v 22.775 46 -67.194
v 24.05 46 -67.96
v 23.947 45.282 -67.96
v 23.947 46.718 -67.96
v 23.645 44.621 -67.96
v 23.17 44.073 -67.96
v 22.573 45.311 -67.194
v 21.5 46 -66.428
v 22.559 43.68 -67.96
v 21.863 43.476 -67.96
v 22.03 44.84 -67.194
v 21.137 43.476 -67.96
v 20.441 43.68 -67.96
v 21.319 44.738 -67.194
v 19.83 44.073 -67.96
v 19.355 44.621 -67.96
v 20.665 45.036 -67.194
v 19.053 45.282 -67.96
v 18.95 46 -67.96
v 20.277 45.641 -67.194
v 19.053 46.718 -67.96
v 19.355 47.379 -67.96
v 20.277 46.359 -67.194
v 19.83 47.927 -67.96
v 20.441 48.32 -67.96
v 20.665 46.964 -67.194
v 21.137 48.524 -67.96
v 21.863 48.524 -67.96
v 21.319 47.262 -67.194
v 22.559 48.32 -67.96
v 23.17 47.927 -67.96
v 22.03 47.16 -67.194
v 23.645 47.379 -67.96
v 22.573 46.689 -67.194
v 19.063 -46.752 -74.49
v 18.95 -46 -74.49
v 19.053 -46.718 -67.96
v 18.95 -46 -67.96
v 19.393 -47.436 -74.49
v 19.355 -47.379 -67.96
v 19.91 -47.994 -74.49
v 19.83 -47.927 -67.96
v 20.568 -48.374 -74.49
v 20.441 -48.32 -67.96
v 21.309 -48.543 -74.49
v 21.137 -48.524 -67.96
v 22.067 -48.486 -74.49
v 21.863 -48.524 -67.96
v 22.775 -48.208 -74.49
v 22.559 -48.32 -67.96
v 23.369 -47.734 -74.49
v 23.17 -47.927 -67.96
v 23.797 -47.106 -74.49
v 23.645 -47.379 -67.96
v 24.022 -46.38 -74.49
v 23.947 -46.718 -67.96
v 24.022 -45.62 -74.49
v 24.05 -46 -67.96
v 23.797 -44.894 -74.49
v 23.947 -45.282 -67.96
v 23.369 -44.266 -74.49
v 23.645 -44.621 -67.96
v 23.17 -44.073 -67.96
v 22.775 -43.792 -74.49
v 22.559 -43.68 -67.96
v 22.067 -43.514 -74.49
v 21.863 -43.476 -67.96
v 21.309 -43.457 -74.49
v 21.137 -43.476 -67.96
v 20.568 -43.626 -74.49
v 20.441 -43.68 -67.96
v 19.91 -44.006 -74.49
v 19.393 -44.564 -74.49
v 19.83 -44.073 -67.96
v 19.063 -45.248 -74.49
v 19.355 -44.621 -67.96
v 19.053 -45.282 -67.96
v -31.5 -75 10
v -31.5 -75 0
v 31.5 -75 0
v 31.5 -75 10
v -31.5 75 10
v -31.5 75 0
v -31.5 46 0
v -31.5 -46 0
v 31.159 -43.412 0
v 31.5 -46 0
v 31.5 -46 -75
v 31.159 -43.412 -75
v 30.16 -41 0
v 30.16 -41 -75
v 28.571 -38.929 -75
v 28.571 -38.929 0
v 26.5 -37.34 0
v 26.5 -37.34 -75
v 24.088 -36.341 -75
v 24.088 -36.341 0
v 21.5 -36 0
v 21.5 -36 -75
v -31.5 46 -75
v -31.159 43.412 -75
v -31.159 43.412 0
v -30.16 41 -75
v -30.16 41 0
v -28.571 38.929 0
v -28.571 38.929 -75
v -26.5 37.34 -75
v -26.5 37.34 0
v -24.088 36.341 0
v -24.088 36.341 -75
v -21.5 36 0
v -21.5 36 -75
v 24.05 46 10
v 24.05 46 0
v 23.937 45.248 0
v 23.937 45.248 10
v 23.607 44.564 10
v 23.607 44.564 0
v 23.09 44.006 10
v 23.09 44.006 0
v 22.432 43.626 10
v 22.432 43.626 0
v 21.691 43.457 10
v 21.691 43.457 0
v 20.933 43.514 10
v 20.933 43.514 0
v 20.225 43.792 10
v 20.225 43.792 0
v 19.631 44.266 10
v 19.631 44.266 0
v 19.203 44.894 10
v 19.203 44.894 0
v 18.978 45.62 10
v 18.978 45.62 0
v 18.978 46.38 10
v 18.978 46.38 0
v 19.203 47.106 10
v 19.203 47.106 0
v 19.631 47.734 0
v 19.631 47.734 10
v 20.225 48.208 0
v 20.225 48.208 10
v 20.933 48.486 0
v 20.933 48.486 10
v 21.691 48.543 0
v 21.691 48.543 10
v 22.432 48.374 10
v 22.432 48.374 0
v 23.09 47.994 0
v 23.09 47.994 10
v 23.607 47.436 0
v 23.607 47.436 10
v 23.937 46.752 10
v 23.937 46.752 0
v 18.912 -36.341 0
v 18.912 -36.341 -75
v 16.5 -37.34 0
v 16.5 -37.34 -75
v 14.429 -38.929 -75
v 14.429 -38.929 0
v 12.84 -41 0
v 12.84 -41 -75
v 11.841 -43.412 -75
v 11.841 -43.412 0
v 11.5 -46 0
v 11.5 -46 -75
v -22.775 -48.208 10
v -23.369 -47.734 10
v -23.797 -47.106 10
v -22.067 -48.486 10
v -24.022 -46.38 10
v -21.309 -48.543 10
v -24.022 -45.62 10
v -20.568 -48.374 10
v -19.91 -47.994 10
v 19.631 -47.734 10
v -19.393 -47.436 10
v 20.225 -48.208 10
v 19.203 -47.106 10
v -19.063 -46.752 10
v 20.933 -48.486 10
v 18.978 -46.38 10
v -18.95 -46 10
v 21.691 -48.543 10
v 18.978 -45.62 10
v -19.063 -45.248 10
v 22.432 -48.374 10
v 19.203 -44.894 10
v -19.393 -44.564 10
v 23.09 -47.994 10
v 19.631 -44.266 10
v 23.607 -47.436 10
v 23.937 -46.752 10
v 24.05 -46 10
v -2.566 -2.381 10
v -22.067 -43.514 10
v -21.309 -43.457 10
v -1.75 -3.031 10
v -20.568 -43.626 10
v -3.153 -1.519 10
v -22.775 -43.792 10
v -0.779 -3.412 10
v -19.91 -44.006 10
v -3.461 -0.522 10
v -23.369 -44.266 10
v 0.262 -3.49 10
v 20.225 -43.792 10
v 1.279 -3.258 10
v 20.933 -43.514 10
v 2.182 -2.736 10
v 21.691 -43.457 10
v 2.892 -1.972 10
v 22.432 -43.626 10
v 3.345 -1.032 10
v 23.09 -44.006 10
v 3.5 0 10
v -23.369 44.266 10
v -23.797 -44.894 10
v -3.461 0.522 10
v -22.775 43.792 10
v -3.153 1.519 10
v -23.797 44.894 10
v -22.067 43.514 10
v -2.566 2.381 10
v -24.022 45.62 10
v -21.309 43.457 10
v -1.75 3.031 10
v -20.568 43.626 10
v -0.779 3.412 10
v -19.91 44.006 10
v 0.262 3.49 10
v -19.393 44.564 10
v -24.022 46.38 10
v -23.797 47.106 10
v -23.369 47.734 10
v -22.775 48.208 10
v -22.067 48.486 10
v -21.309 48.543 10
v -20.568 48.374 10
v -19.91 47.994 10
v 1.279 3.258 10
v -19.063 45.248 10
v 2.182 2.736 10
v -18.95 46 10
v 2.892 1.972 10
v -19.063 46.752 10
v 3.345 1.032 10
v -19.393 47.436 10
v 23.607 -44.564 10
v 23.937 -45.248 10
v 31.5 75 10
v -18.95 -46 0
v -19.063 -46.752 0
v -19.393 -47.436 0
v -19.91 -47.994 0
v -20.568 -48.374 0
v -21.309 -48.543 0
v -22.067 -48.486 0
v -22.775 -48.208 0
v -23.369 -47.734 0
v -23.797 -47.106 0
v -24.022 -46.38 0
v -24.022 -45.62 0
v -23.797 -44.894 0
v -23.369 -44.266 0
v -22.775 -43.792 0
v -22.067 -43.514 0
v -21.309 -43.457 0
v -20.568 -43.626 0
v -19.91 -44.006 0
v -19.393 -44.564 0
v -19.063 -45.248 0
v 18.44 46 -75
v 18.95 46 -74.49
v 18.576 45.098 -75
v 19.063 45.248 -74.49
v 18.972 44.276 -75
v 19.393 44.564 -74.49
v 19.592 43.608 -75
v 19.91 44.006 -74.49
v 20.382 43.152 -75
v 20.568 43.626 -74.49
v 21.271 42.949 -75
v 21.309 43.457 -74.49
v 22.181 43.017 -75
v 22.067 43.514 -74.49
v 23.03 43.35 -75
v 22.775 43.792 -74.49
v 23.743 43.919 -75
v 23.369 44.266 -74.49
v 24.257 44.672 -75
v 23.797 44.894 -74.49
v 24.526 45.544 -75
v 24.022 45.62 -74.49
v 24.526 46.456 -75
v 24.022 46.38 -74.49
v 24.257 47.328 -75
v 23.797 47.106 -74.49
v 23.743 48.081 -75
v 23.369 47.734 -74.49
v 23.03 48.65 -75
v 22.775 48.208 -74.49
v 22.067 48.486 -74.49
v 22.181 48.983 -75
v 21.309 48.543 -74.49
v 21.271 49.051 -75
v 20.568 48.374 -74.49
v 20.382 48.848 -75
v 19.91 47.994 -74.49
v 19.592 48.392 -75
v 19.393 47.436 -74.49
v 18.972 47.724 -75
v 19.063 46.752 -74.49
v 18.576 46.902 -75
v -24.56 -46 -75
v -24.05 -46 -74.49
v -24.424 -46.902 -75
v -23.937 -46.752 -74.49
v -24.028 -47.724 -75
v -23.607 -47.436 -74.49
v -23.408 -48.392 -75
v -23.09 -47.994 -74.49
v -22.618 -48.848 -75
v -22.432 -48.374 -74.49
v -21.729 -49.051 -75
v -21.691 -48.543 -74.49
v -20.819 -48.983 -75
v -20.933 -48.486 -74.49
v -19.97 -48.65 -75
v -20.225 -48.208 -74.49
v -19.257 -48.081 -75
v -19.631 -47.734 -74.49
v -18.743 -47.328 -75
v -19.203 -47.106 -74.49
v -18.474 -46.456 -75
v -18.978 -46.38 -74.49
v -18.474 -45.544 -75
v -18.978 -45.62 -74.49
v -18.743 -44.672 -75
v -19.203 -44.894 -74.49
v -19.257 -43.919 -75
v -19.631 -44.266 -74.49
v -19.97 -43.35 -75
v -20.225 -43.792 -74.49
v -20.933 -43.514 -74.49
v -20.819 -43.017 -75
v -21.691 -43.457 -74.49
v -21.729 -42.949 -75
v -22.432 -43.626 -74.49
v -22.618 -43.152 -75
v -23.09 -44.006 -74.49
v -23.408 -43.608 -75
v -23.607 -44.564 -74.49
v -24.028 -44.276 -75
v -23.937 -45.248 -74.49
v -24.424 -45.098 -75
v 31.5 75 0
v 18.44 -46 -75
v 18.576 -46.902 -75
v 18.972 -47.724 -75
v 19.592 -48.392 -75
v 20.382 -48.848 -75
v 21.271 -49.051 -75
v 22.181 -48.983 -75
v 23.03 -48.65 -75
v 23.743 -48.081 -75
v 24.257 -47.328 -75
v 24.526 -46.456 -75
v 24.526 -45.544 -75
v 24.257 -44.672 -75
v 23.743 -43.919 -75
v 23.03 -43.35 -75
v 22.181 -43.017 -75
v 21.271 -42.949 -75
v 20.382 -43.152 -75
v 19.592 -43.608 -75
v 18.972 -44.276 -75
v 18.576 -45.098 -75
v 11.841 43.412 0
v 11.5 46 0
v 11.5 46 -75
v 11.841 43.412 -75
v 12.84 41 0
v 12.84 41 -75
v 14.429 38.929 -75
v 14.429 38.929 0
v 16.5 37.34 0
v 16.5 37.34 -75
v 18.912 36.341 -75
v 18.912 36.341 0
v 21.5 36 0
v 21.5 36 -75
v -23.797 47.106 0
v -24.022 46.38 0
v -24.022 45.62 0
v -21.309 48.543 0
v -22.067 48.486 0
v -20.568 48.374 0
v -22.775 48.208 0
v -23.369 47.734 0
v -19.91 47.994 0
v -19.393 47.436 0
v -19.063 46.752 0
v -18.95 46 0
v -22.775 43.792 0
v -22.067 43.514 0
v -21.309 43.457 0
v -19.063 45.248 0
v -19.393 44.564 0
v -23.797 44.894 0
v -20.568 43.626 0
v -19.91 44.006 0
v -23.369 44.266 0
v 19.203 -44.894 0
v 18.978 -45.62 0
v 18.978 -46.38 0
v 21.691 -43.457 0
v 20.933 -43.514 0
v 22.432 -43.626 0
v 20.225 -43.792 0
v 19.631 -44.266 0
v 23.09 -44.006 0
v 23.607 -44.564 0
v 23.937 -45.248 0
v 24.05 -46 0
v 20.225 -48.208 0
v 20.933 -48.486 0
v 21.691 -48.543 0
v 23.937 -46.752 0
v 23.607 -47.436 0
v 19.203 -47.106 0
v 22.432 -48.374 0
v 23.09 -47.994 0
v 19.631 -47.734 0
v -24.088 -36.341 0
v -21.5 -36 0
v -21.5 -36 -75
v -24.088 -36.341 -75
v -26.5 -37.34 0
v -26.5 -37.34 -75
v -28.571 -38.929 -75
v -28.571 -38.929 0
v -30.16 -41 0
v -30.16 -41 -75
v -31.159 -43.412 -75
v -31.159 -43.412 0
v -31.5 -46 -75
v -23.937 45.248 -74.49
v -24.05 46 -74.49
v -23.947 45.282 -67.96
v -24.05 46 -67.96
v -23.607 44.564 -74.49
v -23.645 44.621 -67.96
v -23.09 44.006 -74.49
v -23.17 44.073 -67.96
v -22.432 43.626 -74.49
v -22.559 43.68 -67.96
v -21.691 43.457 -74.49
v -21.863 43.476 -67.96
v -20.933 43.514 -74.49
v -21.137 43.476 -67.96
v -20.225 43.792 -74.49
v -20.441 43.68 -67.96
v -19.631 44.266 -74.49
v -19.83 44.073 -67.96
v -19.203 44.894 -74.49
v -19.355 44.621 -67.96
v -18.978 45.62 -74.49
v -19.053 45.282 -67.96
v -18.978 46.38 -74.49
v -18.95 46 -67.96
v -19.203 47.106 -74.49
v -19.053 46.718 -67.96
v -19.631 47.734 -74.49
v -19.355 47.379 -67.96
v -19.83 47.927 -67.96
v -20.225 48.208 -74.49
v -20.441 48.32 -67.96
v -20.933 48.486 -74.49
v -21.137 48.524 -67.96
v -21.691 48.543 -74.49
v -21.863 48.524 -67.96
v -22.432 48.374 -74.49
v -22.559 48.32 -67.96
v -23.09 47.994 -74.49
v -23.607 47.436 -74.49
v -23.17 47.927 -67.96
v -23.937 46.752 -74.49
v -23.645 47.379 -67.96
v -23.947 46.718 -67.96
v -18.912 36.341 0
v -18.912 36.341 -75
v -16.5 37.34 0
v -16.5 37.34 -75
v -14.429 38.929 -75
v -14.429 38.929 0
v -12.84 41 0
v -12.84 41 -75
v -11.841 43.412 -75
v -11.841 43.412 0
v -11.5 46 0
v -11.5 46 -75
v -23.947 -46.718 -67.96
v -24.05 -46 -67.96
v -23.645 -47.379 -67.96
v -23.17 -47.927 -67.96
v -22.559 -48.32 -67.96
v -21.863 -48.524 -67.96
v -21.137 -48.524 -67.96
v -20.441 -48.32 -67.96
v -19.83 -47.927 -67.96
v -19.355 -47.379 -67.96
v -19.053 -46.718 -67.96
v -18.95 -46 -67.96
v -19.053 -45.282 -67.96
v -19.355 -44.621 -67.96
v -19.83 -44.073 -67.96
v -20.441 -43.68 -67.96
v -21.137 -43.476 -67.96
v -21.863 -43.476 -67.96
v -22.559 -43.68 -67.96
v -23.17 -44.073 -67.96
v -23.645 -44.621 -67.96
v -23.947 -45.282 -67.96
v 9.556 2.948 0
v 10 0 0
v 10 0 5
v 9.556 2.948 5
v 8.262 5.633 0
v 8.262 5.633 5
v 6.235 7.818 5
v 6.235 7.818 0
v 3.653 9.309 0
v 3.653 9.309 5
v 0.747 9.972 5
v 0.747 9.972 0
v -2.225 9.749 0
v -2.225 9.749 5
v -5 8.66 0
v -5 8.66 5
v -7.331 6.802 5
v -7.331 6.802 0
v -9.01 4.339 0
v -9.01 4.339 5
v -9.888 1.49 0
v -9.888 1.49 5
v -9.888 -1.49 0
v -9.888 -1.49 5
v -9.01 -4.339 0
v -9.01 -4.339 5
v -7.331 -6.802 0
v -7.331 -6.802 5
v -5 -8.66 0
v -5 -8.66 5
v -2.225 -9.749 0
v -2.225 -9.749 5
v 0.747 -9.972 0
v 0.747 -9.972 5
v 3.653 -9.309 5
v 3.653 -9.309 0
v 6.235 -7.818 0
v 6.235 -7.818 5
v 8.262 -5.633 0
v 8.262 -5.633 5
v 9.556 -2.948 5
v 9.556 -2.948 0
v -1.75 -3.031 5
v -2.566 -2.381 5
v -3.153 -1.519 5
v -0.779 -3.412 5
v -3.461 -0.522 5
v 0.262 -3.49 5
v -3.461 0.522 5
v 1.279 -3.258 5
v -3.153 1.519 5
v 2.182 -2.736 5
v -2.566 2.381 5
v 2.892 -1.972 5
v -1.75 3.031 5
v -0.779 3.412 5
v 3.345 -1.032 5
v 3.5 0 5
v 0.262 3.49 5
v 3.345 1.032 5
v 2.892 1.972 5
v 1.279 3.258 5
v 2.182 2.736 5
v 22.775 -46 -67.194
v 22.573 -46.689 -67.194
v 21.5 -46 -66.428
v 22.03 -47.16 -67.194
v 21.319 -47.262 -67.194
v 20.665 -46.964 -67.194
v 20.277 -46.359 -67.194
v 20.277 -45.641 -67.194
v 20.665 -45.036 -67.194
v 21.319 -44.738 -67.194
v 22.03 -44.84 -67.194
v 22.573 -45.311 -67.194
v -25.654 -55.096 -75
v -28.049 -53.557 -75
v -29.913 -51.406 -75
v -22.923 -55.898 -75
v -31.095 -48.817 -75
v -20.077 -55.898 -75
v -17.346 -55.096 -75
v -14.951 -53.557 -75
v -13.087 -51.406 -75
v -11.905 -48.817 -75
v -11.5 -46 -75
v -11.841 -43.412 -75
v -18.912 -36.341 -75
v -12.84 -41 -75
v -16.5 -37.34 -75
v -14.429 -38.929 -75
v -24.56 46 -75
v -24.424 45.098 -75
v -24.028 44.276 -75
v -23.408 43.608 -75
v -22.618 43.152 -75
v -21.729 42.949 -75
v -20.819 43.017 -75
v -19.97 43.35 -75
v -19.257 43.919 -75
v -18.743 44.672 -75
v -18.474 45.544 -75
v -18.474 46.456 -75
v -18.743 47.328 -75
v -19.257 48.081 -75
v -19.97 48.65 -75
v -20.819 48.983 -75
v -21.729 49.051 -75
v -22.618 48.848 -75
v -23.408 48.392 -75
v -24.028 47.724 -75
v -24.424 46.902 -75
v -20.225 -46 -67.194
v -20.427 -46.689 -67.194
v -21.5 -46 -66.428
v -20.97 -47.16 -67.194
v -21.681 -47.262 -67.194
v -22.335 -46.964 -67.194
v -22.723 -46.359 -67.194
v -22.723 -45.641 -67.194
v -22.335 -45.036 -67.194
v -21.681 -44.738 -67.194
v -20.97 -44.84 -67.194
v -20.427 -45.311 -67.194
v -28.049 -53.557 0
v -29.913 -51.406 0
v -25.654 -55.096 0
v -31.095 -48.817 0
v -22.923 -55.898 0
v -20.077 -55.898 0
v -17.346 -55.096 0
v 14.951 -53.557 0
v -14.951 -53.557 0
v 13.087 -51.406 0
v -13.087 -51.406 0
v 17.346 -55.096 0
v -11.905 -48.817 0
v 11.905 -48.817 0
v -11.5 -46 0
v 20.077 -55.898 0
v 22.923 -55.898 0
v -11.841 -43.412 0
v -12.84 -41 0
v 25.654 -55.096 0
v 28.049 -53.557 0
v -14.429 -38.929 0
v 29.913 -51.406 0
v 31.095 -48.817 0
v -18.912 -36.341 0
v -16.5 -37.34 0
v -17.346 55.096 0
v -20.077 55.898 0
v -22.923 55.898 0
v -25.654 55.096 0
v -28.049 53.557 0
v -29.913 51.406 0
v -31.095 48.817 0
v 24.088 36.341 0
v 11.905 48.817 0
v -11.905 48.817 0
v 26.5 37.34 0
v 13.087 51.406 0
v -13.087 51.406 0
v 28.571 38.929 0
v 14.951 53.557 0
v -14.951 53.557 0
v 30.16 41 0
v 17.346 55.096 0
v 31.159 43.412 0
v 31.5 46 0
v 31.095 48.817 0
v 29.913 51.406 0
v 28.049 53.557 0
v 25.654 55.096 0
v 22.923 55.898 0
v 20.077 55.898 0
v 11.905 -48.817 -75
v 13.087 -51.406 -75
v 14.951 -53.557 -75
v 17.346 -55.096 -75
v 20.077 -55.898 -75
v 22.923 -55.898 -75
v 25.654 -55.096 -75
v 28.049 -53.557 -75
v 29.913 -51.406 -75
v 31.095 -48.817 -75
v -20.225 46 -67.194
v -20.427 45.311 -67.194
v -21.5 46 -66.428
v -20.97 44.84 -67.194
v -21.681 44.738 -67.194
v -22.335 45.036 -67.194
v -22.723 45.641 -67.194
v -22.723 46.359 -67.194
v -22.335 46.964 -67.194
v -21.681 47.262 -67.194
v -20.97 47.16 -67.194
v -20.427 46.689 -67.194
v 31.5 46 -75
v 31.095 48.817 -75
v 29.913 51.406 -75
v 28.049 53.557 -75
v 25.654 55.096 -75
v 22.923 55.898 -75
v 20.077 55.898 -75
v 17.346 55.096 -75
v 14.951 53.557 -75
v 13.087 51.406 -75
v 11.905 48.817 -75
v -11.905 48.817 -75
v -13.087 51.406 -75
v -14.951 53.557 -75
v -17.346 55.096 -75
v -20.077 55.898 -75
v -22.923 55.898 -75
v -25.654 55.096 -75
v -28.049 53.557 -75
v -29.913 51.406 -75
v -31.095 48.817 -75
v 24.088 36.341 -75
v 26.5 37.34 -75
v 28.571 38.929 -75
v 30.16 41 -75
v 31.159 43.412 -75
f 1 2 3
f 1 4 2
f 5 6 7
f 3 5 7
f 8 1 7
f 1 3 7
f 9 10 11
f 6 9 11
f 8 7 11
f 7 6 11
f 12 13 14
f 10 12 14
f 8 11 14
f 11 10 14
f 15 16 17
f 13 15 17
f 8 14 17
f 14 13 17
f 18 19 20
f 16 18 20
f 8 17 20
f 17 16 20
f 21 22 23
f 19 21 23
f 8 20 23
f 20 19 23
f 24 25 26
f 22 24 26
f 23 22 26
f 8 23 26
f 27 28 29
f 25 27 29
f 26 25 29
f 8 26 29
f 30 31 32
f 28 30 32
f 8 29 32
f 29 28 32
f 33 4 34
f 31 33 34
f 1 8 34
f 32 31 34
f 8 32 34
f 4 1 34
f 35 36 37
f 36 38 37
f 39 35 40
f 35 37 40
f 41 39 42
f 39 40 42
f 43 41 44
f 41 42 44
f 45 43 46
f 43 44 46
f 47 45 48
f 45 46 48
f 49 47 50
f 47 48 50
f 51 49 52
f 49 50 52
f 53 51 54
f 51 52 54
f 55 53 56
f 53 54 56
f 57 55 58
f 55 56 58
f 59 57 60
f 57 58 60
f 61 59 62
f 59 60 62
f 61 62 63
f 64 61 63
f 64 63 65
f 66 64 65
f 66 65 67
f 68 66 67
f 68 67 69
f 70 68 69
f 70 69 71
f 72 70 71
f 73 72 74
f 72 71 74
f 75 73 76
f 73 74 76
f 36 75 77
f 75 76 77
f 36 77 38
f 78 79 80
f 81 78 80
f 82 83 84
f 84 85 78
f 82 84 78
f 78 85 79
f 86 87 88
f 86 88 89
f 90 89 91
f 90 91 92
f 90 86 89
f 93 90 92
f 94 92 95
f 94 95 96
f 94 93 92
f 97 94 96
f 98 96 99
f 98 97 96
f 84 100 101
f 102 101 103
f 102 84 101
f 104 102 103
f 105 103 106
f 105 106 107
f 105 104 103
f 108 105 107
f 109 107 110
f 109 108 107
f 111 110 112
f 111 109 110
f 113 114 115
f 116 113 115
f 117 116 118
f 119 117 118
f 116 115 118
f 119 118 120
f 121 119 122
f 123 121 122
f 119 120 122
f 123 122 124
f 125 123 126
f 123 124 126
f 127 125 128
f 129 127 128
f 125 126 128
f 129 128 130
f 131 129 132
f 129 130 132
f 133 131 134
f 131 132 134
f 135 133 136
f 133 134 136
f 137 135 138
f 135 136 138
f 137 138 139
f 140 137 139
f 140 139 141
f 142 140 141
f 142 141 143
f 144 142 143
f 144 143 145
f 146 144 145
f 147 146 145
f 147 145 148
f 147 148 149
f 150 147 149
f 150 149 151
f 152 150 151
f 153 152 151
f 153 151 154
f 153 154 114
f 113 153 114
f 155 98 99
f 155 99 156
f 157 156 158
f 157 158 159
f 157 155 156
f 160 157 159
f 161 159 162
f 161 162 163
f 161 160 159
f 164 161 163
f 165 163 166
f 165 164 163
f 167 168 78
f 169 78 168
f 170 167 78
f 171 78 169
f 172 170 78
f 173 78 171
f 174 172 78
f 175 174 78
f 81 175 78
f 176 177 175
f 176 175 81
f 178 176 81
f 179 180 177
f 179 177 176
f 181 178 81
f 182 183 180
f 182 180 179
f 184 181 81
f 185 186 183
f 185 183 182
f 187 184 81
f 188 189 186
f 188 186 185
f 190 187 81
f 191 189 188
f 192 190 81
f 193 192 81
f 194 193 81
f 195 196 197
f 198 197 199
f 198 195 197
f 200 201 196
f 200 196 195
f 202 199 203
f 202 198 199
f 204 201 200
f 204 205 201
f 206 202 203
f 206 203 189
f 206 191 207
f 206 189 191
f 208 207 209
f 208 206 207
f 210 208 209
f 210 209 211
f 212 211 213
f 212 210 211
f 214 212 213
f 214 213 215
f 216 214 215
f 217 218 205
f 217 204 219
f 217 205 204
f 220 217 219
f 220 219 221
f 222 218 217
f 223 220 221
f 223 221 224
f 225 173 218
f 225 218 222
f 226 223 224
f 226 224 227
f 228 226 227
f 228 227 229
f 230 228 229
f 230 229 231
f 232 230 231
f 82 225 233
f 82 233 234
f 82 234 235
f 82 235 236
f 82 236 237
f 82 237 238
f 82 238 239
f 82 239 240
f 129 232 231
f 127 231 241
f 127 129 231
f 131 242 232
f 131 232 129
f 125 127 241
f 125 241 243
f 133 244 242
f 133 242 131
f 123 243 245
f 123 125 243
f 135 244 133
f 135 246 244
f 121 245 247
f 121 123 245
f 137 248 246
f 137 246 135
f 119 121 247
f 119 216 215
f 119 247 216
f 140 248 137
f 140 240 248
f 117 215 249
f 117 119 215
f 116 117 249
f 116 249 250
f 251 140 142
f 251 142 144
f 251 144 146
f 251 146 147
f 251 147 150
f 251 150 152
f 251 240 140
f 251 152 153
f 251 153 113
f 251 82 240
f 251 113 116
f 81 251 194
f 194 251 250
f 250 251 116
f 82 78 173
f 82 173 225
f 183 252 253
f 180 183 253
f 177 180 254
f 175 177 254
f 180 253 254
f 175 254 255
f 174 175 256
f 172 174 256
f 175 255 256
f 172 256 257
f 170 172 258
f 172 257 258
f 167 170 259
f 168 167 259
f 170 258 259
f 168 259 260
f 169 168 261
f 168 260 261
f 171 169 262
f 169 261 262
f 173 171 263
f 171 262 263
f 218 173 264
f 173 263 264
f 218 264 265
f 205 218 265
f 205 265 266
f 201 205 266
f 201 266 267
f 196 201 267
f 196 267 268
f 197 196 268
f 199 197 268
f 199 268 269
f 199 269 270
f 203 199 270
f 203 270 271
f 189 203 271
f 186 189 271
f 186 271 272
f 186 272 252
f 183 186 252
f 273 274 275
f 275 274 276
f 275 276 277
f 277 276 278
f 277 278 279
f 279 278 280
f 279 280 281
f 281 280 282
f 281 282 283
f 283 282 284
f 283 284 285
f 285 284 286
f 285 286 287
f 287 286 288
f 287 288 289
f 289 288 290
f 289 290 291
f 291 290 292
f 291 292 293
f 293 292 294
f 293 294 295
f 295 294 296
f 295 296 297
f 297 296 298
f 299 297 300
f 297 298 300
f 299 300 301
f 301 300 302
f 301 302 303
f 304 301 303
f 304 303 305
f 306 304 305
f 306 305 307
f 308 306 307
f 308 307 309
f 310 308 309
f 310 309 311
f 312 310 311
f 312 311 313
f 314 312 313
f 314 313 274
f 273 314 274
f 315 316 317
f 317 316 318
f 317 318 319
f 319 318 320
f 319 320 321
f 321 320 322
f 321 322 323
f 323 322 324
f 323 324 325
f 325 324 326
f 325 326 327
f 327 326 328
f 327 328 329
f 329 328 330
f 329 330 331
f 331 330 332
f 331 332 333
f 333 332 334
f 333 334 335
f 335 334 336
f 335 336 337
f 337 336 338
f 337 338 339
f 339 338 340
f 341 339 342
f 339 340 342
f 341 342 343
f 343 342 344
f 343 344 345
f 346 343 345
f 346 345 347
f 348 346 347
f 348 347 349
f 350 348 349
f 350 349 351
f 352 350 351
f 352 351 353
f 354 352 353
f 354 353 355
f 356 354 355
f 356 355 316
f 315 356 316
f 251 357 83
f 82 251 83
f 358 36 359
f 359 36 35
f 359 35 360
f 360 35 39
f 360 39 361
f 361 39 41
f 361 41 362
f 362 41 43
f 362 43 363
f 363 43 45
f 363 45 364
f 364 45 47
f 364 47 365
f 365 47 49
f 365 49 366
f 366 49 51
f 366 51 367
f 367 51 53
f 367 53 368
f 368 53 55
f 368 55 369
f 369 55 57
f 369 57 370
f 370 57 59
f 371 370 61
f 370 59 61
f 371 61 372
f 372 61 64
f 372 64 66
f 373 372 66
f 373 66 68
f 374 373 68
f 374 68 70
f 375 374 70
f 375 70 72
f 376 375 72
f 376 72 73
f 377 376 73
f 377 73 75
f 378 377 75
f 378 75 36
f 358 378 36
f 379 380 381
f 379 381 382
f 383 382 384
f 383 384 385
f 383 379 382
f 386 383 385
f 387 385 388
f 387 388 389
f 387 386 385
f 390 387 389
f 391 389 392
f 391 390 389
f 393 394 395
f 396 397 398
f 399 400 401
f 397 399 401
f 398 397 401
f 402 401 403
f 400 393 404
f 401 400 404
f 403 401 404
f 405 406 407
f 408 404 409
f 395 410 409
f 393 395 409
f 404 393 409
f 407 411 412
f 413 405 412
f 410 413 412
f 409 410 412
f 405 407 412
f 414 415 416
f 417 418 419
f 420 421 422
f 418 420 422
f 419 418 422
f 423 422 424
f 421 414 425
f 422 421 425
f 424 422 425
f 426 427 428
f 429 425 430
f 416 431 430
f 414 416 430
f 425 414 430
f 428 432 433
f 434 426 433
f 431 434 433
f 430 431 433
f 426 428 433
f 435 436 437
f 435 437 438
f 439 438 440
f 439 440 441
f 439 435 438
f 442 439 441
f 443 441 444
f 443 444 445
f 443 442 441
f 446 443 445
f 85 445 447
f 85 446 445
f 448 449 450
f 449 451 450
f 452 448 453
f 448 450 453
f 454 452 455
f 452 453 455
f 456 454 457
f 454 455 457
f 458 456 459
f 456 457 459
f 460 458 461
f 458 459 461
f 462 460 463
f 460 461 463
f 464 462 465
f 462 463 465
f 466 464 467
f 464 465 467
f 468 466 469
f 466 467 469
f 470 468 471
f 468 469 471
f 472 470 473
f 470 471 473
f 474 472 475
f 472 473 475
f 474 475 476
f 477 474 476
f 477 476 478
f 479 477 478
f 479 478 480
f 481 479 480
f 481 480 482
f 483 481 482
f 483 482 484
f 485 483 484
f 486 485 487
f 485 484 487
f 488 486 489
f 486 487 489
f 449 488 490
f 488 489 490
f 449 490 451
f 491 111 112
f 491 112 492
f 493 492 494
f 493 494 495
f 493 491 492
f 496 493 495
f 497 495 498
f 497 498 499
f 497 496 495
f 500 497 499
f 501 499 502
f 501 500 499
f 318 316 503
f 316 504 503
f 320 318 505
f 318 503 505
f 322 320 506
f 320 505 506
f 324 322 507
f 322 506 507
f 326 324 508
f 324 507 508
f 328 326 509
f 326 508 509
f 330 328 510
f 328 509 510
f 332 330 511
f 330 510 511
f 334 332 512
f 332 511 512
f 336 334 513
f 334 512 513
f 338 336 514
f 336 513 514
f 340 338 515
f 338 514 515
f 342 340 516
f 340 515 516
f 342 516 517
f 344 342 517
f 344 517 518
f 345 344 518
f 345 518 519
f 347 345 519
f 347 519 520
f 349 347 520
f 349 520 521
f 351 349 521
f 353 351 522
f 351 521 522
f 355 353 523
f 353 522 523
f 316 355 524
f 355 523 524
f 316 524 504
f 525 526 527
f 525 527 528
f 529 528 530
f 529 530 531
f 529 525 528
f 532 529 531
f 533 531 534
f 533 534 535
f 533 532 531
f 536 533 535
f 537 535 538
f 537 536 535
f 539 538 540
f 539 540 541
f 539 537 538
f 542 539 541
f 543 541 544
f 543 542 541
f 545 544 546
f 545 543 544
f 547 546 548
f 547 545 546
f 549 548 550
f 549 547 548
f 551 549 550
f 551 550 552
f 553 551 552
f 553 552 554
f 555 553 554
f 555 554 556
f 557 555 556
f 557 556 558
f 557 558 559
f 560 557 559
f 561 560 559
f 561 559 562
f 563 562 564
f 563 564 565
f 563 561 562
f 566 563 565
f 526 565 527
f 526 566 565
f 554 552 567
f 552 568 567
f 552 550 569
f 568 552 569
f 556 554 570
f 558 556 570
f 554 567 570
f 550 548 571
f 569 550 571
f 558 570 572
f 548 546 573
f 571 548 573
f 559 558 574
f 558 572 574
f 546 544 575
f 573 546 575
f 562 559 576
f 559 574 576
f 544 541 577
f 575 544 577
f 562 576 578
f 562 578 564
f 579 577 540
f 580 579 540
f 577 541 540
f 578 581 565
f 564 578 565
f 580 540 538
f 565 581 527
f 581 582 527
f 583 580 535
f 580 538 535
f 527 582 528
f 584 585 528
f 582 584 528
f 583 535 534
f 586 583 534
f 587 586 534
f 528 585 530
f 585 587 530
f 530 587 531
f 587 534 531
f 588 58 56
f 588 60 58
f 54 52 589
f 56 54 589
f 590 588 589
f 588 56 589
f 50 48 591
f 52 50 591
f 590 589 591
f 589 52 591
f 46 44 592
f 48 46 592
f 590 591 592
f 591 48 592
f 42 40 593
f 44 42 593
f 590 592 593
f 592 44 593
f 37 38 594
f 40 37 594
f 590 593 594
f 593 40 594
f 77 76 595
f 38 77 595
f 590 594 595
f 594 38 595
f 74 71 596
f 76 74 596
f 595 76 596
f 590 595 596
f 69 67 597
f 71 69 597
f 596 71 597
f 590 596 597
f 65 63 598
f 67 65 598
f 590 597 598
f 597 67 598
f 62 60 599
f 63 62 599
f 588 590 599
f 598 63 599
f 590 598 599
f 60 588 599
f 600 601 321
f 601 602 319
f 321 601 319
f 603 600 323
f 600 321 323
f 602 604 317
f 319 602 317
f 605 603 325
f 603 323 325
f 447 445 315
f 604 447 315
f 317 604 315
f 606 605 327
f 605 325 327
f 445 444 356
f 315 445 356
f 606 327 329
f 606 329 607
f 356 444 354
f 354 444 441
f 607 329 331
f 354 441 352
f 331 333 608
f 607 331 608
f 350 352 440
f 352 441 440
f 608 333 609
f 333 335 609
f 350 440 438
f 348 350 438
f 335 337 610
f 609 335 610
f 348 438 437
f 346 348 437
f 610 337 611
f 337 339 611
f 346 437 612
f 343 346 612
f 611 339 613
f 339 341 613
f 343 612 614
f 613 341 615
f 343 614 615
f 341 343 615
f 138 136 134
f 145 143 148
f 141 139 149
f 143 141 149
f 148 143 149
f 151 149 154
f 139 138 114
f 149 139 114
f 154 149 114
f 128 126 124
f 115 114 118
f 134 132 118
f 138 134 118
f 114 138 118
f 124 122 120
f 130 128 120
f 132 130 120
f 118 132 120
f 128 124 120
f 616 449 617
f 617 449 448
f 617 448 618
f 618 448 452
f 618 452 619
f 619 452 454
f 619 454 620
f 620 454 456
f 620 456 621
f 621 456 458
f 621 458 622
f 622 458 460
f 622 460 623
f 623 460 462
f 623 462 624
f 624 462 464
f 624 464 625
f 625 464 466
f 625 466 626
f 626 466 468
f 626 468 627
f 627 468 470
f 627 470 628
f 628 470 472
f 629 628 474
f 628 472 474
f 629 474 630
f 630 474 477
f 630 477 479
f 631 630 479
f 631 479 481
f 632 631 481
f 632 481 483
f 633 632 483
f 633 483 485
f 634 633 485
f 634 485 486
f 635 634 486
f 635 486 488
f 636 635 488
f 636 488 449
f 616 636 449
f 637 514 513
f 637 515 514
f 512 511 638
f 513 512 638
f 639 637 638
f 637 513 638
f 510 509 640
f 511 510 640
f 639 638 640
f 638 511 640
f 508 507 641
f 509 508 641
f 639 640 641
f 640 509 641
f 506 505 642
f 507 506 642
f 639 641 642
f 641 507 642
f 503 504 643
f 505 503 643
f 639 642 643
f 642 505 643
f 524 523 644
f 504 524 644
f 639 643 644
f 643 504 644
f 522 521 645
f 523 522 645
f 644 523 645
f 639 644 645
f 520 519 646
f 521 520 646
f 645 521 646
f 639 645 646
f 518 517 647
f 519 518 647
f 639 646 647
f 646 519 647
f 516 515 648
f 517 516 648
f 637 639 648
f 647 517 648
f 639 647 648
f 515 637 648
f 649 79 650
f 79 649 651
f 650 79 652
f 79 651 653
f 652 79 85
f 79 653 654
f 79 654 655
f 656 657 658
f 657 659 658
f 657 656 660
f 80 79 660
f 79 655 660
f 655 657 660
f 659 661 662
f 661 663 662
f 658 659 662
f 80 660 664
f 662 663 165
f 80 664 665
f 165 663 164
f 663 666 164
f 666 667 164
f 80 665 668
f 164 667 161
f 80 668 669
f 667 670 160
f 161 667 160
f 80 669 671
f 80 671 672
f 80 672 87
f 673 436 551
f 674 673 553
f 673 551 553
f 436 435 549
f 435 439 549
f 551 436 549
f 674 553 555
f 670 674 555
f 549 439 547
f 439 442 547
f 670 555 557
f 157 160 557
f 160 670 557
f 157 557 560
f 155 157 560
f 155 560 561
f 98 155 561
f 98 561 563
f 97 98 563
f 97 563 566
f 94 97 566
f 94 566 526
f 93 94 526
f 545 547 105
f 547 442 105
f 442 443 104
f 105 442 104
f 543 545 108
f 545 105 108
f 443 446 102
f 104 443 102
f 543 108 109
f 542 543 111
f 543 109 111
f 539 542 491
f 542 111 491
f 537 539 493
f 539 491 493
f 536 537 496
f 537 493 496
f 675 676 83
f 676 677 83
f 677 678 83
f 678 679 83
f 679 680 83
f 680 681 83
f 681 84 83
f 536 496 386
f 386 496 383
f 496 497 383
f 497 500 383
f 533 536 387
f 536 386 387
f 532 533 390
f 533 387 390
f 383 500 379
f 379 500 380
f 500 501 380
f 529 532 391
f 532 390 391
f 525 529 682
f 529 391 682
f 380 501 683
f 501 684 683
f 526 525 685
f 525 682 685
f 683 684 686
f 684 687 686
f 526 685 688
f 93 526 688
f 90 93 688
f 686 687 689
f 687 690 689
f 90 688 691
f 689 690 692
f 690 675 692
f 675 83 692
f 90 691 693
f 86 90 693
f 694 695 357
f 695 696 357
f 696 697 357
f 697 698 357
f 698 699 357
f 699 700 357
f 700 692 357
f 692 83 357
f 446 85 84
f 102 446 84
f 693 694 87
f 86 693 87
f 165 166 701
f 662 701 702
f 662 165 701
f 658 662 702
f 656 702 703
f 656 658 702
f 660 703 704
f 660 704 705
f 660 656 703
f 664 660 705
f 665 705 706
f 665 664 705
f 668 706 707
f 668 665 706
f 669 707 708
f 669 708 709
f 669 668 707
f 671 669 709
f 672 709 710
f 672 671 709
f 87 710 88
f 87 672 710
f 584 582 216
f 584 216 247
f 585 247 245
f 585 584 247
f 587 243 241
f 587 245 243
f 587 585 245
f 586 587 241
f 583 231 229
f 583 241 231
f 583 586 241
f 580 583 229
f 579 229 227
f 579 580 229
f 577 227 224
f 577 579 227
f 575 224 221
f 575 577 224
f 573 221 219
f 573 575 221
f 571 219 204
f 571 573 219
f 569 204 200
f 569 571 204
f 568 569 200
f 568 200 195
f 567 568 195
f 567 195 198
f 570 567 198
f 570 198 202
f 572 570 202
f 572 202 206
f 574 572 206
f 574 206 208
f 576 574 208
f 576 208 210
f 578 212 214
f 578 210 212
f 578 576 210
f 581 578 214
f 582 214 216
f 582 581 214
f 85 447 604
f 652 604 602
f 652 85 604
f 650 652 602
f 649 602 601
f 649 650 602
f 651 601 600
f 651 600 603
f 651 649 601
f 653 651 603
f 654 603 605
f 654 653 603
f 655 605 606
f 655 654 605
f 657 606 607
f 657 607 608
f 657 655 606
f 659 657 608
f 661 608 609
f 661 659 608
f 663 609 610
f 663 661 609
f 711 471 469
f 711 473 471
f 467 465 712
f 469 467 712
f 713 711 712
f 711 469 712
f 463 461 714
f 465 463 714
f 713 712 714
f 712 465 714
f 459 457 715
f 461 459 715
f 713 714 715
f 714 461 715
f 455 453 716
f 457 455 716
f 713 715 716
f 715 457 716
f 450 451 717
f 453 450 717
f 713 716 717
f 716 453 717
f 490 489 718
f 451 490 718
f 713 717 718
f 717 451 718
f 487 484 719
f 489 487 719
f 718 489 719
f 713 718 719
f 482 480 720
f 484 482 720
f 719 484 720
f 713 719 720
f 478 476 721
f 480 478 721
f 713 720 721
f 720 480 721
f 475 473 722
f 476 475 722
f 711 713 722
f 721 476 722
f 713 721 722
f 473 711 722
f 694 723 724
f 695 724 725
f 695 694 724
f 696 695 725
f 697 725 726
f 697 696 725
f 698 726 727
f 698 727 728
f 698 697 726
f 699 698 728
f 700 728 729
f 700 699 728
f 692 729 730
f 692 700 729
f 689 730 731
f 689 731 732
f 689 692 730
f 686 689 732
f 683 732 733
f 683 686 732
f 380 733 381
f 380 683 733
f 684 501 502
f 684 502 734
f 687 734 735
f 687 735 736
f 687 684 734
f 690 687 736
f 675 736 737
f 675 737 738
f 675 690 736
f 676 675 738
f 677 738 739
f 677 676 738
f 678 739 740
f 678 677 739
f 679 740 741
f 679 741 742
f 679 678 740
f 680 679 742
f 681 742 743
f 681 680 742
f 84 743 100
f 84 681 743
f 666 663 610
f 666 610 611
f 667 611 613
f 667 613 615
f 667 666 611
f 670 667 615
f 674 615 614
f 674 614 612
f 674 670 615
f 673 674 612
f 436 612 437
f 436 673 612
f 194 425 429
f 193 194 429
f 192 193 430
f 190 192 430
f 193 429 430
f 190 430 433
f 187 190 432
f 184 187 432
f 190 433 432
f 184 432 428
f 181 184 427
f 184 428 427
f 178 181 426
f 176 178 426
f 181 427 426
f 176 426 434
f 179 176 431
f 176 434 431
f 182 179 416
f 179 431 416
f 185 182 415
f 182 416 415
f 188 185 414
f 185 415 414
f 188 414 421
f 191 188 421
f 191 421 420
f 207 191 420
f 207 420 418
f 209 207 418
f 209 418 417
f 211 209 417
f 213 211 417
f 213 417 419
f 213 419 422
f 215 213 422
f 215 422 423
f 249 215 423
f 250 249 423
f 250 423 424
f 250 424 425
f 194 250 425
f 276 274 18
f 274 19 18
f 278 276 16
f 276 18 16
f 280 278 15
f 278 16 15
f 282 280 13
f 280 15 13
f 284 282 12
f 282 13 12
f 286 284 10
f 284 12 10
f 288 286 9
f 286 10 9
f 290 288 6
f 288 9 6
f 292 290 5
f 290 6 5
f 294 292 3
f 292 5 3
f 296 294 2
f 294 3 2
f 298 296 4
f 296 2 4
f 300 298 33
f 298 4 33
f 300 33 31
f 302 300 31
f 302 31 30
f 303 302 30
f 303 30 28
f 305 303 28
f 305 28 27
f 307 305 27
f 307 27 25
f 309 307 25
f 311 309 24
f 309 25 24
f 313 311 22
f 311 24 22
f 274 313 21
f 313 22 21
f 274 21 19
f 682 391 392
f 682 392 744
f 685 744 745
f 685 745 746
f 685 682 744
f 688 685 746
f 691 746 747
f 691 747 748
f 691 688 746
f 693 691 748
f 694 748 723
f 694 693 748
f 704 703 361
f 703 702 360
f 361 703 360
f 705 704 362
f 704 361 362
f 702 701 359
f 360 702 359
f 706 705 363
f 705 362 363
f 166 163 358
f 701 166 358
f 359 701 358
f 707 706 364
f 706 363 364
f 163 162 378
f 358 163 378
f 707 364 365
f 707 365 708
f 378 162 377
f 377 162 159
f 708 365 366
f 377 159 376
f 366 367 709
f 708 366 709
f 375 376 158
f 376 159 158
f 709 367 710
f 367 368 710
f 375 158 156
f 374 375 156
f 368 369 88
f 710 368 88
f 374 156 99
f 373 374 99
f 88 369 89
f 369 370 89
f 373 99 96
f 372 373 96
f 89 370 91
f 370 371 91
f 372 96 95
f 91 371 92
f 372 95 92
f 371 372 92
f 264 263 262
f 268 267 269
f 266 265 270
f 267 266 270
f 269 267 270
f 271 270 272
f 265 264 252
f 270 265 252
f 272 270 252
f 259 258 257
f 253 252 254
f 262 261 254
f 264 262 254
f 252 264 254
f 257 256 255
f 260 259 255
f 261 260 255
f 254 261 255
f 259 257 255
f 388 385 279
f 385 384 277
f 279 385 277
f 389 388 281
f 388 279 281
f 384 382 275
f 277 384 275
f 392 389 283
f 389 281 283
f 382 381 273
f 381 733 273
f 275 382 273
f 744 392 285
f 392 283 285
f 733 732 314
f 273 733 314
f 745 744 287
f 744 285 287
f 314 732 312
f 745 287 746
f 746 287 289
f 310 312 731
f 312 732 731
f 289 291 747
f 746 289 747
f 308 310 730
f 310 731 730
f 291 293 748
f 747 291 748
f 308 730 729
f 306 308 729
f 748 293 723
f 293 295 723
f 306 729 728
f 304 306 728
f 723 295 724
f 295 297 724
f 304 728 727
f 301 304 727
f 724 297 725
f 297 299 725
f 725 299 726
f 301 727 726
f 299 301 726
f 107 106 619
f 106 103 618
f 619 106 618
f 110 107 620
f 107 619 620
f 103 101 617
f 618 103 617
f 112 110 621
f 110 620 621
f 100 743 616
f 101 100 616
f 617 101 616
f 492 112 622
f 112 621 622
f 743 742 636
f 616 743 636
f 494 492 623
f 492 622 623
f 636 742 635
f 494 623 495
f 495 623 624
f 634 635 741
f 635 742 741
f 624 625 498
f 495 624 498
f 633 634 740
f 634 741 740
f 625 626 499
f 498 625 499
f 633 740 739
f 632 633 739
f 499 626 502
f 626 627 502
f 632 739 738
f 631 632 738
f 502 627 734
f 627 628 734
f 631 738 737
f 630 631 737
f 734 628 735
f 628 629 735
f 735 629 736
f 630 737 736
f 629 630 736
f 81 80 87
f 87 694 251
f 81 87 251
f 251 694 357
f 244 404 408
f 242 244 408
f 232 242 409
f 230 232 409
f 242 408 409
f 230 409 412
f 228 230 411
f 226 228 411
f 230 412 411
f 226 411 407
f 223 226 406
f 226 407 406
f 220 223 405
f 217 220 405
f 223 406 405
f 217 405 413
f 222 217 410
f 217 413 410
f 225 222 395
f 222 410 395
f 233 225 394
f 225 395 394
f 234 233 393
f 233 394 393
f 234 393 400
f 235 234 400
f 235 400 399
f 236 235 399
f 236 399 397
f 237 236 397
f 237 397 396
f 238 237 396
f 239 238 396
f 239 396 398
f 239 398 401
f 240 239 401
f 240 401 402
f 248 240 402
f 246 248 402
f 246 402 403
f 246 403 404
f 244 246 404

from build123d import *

# Parameters (mm, degrees)
F5_DEPTH               = 10
F6_DEPTH               = 75
F11_D                  = 5.1
F11_DEPTH              = 7.04
F11_CSINK_D            = 6.12
F11_CSINK_ANGLE        = 90
F11_TIP                = 1.5321945785
F11_ON_F9_D            = 5.1
F11_ON_F9_DEPTH        = 7.04
F11_ON_F9_CSINK_D      = 6.12
F11_ON_F9_CSINK_ANGLE  = 90
F11_ON_F9_TIP          = 1.5321945785
F11_ON_F10_D           = 5.1
F11_ON_F10_DEPTH       = 7.04
F11_ON_F10_CSINK_D     = 6.12
F11_ON_F10_CSINK_ANGLE = 90
F11_ON_F10_TIP         = 1.5321945785
F11_ON_F8_D            = 5.1
F11_ON_F8_DEPTH        = 7.04
F11_ON_F8_CSINK_D      = 6.12
F11_ON_F8_CSINK_ANGLE  = 90
F11_ON_F8_TIP          = 1.5321945785
F12_D                  = 5.1
F12_DEPTH              = 11
F12_TIP                = 1.5321945785
F13_R                  = 3.5
F14_DEPTH              = 25
F15_R                  = 10
F16_DEPTH              = 5


with BuildPart() as f5:
    # F4 (on Top) → F5 (new body)
    with BuildSketch(Plane.XY):
        with BuildLine():
            ThreePointArc((21.5, -36), (28.5710678119, -38.9289321881), (31.5, -46))
            Line((31.5, -46), (31.5, 46))
            ThreePointArc((31.5, 46), (28.5710678119, 38.9289321881), (21.5, 36))
            Line((21.5, 36), (21.5, -36))
        make_face()
        with BuildLine():
            Line((-31.5, -75), (31.5, -75))
            Line((31.5, -75), (31.5, -46))
            ThreePointArc((31.5, -46), (21.5, -56), (11.5, -46))
            Line((11.5, -46), (-11.5, -46))
            ThreePointArc((-11.5, -46), (-21.5, -56), (-31.5, -46))
            Line((-31.5, -46), (-31.5, -75))
        make_face()
        with BuildLine():
            Line((-31.5, 45.999999887), (-31.5, -46))
            ThreePointArc((-31.5, -46), (-28.5710678119, -38.9289321881), (-21.5, -36))
            Line((-21.5, -36), (-21.5, 36))
            ThreePointArc((-21.5, 36), (-28.5710677719, 38.9289321482), (-31.5, 45.999999887))
        make_face()
        with BuildLine():
            ThreePointArc((11.5, -46), (14.4289321881, -38.9289321881), (21.5, -36))
            Line((21.5, -36), (21.5, 36))
            ThreePointArc((21.5, 36), (14.4289321881, 38.9289321881), (11.5, 46))
            Line((11.5, 46), (-11.5, 46))
            ThreePointArc((-11.5, 46), (-14.4289321881, 38.9289321881), (-21.5, 36))
            Line((-21.5, 36), (-21.5, -36))
            ThreePointArc((-21.5, -36), (-14.4289321881, -38.9289321881), (-11.5, -46))
            Line((-11.5, -46), (11.5, -46))
        make_face()
        with BuildLine():
            ThreePointArc((-21.5, -36), (-28.5710678119, -38.9289321881), (-31.5, -46))
            ThreePointArc((-31.5, -46), (-21.5, -56), (-11.5, -46))
            Line((-11.5, -46), (-18.95, -46))
            ThreePointArc((-18.95, -46), (-23.303122292, -47.803122292), (-21.5, -43.45))
            Line((-21.5, -43.45), (-21.5, -36))
        make_face()
        with BuildLine():
            ThreePointArc((-11.5, -46), (-14.4289321881, -38.9289321881), (-21.5, -36))
            Line((-21.5, -36), (-21.5, -43.45))
            ThreePointArc((-21.5, -43.45), (-19.696877708, -44.196877708), (-18.95, -46))
            Line((-18.95, -46), (-11.5, -46))
        make_face()
        with BuildLine():
            Line((-21.5, -46), (-21.5, -43.45))
            ThreePointArc((-21.5, -43.45), (-23.303122292, -47.803122292), (-18.95, -46))
            Line((-18.95, -46), (-21.5, -46))
        make_face()
        with BuildLine():
            ThreePointArc((-18.95, -46), (-19.696877708, -44.196877708), (-21.5, -43.45))
            Line((-21.5, -43.45), (-21.5, -46))
            Line((-21.5, -46), (-18.95, -46))
        make_face()
        with BuildLine():
            ThreePointArc((11.5, -46), (21.5, -56), (31.5, -46))
            ThreePointArc((31.5, -46), (28.5710678119, -38.9289321881), (21.5, -36))
            Line((21.5, -36), (21.5, -43.45))
            ThreePointArc((21.5, -43.45), (23.303122292, -44.196877708), (24.05, -46))
            ThreePointArc((24.05, -46), (21.5, -48.55), (18.95, -46))
            Line((18.95, -46), (11.5, -46))
        make_face()
        with BuildLine():
            Line((21.5, -46), (21.5, -43.45))
            ThreePointArc((21.5, -43.45), (19.696877708, -44.196877708), (18.95, -46))
            Line((18.95, -46), (21.5, -46))
        make_face()
        with BuildLine():
            ThreePointArc((24.05, -46), (23.303122292, -44.196877708), (21.5, -43.45))
            Line((21.5, -43.45), (21.5, -46))
            Line((21.5, -46), (18.95, -46))
            ThreePointArc((18.95, -46), (21.5, -48.55), (24.05, -46))
        make_face()
        with BuildLine():
            Line((21.5, -43.45), (21.5, -36))
            ThreePointArc((21.5, -36), (14.4289321881, -38.9289321881), (11.5, -46))
            Line((11.5, -46), (18.95, -46))
            ThreePointArc((18.95, -46), (19.696877708, -44.196877708), (21.5, -43.45))
        make_face()
        with BuildLine():
            Line((18.95, 46), (11.5, 46))
            ThreePointArc((11.5, 46), (14.4289321881, 38.9289321881), (21.5, 36))
            Line((21.5, 36), (21.5, 43.45))
            ThreePointArc((21.5, 43.45), (19.696877708, 44.196877708), (18.95, 46))
        make_face()
        with BuildLine():
            Line((21.5, 46), (18.95, 46))
            ThreePointArc((18.95, 46), (19.696877708, 44.196877708), (21.5, 43.45))
            Line((21.5, 43.45), (21.5, 46))
        make_face()
        with BuildLine():
            ThreePointArc((24.05, 46), (21.5, 48.55), (18.95, 46))
            Line((18.95, 46), (21.5, 46))
            Line((21.5, 46), (21.5, 43.45))
            ThreePointArc((21.5, 43.45), (23.303122292, 44.196877708), (24.05, 46))
        make_face()
        with BuildLine():
            ThreePointArc((21.5, 36), (28.5710678119, 38.9289321881), (31.5, 46))
            ThreePointArc((31.5, 46), (21.5, 56), (11.5, 46))
            Line((11.5, 46), (18.95, 46))
            ThreePointArc((18.95, 46), (21.5, 48.55), (24.05, 46))
            ThreePointArc((24.05, 46), (23.303122292, 44.196877708), (21.5, 43.45))
            Line((21.5, 43.45), (21.5, 36))
        make_face()
        with BuildLine():
            ThreePointArc((-21.5, 36), (-14.4289321881, 38.9289321881), (-11.5, 46))
            Line((-11.5, 46), (-18.95, 46))
            ThreePointArc((-18.95, 46), (-19.696877708, 44.196877708), (-21.5, 43.45))
            Line((-21.5, 43.45), (-21.5, 36))
        make_face()
        with BuildLine():
            ThreePointArc((-21.5, 43.45), (-19.696877708, 44.196877708), (-18.95, 46))
            Line((-18.95, 46), (-21.5, 46))
            Line((-21.5, 46), (-21.5, 43.45))
        make_face()
        with BuildLine():
            Line((-21.5, 46), (-18.95, 46))
            ThreePointArc((-18.95, 46), (-23.303122292, 47.803122292), (-21.5, 43.45))
            Line((-21.5, 43.45), (-21.5, 46))
        make_face()
        with BuildLine():
            ThreePointArc((-11.5, 46), (-21.5000000565, 56), (-31.5, 45.999999887))
            ThreePointArc((-31.5, 45.999999887), (-28.5710677719, 38.9289321482), (-21.5, 36))
            Line((-21.5, 36), (-21.5, 43.45))
            ThreePointArc((-21.5, 43.45), (-23.303122292, 47.803122292), (-18.95, 46))
            Line((-18.95, 46), (-11.5, 46))
        make_face()
        with BuildLine():
            ThreePointArc((11.5, 46), (21.5, 56), (31.5, 46))
            Line((31.5, 46), (31.5, 75))
            Line((31.5, 75), (-31.5, 75))
            Line((-31.5, 75), (-31.5, 45.999999887))
            ThreePointArc((-31.5, 45.999999887), (-21.5000000565, 56), (-11.5, 46))
            Line((-11.5, 46), (11.5, 46))
        make_face()
    extrude(amount=F5_DEPTH)

    # F4 (on Top) → F6 (join)
    with BuildSketch(Plane.XY):
        with BuildLine():
            Line((18.95, 46), (11.5, 46))
            ThreePointArc((11.5, 46), (14.4289321881, 38.9289321881), (21.5, 36))
            Line((21.5, 36), (21.5, 43.45))
            ThreePointArc((21.5, 43.45), (19.696877708, 44.196877708), (18.95, 46))
        make_face()
        with BuildLine():
            ThreePointArc((21.5, 36), (28.5710678119, 38.9289321881), (31.5, 46))
            ThreePointArc((31.5, 46), (21.5, 56), (11.5, 46))
            Line((11.5, 46), (18.95, 46))
            ThreePointArc((18.95, 46), (21.5, 48.55), (24.05, 46))
            ThreePointArc((24.05, 46), (23.303122292, 44.196877708), (21.5, 43.45))
            Line((21.5, 43.45), (21.5, 36))
        make_face()
        with BuildLine():
            ThreePointArc((24.05, 46), (21.5, 48.55), (18.95, 46))
            Line((18.95, 46), (21.5, 46))
            Line((21.5, 46), (21.5, 43.45))
            ThreePointArc((21.5, 43.45), (23.303122292, 44.196877708), (24.05, 46))
        make_face()
        with BuildLine():
            Line((21.5, 46), (18.95, 46))
            ThreePointArc((18.95, 46), (19.696877708, 44.196877708), (21.5, 43.45))
            Line((21.5, 43.45), (21.5, 46))
        make_face()
        with BuildLine():
            ThreePointArc((-21.5, 36), (-14.4289321881, 38.9289321881), (-11.5, 46))
            Line((-11.5, 46), (-18.95, 46))
            ThreePointArc((-18.95, 46), (-19.696877708, 44.196877708), (-21.5, 43.45))
            Line((-21.5, 43.45), (-21.5, 36))
        make_face()
        with BuildLine():
            ThreePointArc((-11.5, 46), (-21.5000000565, 56), (-31.5, 45.999999887))
            ThreePointArc((-31.5, 45.999999887), (-28.5710677719, 38.9289321482), (-21.5, 36))
            Line((-21.5, 36), (-21.5, 43.45))
            ThreePointArc((-21.5, 43.45), (-23.303122292, 47.803122292), (-18.95, 46))
            Line((-18.95, 46), (-11.5, 46))
        make_face()
        with BuildLine():
            ThreePointArc((-21.5, 43.45), (-19.696877708, 44.196877708), (-18.95, 46))
            Line((-18.95, 46), (-21.5, 46))
            Line((-21.5, 46), (-21.5, 43.45))
        make_face()
        with BuildLine():
            Line((-21.5, 46), (-18.95, 46))
            ThreePointArc((-18.95, 46), (-23.303122292, 47.803122292), (-21.5, 43.45))
            Line((-21.5, 43.45), (-21.5, 46))
        make_face()
        with BuildLine():
            Line((-21.5, -46), (-21.5, -43.45))
            ThreePointArc((-21.5, -43.45), (-23.303122292, -47.803122292), (-18.95, -46))
            Line((-18.95, -46), (-21.5, -46))
        make_face()
        with BuildLine():
            ThreePointArc((-18.95, -46), (-19.696877708, -44.196877708), (-21.5, -43.45))
            Line((-21.5, -43.45), (-21.5, -46))
            Line((-21.5, -46), (-18.95, -46))
        make_face()
        with BuildLine():
            ThreePointArc((-11.5, -46), (-14.4289321881, -38.9289321881), (-21.5, -36))
            Line((-21.5, -36), (-21.5, -43.45))
            ThreePointArc((-21.5, -43.45), (-19.696877708, -44.196877708), (-18.95, -46))
            Line((-18.95, -46), (-11.5, -46))
        make_face()
        with BuildLine():
            ThreePointArc((-21.5, -36), (-28.5710678119, -38.9289321881), (-31.5, -46))
            ThreePointArc((-31.5, -46), (-21.5, -56), (-11.5, -46))
            Line((-11.5, -46), (-18.95, -46))
            ThreePointArc((-18.95, -46), (-23.303122292, -47.803122292), (-21.5, -43.45))
            Line((-21.5, -43.45), (-21.5, -36))
        make_face()
        with BuildLine():
            ThreePointArc((24.05, -46), (23.303122292, -44.196877708), (21.5, -43.45))
            Line((21.5, -43.45), (21.5, -46))
            Line((21.5, -46), (18.95, -46))
            ThreePointArc((18.95, -46), (21.5, -48.55), (24.05, -46))
        make_face()
        with BuildLine():
            Line((21.5, -46), (21.5, -43.45))
            ThreePointArc((21.5, -43.45), (19.696877708, -44.196877708), (18.95, -46))
            Line((18.95, -46), (21.5, -46))
        make_face()
        with BuildLine():
            Line((21.5, -43.45), (21.5, -36))
            ThreePointArc((21.5, -36), (14.4289321881, -38.9289321881), (11.5, -46))
            Line((11.5, -46), (18.95, -46))
            ThreePointArc((18.95, -46), (19.696877708, -44.196877708), (21.5, -43.45))
        make_face()
        with BuildLine():
            ThreePointArc((11.5, -46), (21.5, -56), (31.5, -46))
            ThreePointArc((31.5, -46), (28.5710678119, -38.9289321881), (21.5, -36))
            Line((21.5, -36), (21.5, -43.45))
            ThreePointArc((21.5, -43.45), (23.303122292, -44.196877708), (24.05, -46))
            ThreePointArc((24.05, -46), (21.5, -48.55), (18.95, -46))
            Line((18.95, -46), (11.5, -46))
        make_face()
    extrude(amount=-F6_DEPTH)

    # F11
    with Locations(Plane(origin=(0, 0, -75), x_dir=(1, 0, 0), z_dir=(0, 0, -1))):
        with Locations((-21.5, -46)):
            CounterSinkHole(F11_D / 2, F11_CSINK_D / 2, depth=F11_DEPTH, counter_sink_angle=F11_CSINK_ANGLE)
            with Locations((0, 0, -(F11_DEPTH + F11_TIP / 2))):  # 118° drill point
                Cone(0, F11_D / 2, F11_TIP, mode=Mode.SUBTRACT)

    # F11 on F9
    with Locations(Plane(origin=(0, 0, -75), x_dir=(1, 0, 0), z_dir=(0, 0, -1))):
        with Locations((-21.5, 46)):
            CounterSinkHole(F11_ON_F9_D / 2, F11_ON_F9_CSINK_D / 2, depth=F11_ON_F9_DEPTH, counter_sink_angle=F11_ON_F9_CSINK_ANGLE)
            with Locations((0, 0, -(F11_ON_F9_DEPTH + F11_ON_F9_TIP / 2))):  # 118° drill point
                Cone(0, F11_ON_F9_D / 2, F11_ON_F9_TIP, mode=Mode.SUBTRACT)

    # F11 on F10
    with Locations(Plane(origin=(0, 0, -75), x_dir=(1, 0, 0), z_dir=(0, 0, -1))):
        with Locations((21.5, 46)):
            CounterSinkHole(F11_ON_F10_D / 2, F11_ON_F10_CSINK_D / 2, depth=F11_ON_F10_DEPTH, counter_sink_angle=F11_ON_F10_CSINK_ANGLE)
            with Locations((0, 0, -(F11_ON_F10_DEPTH + F11_ON_F10_TIP / 2))):  # 118° drill point
                Cone(0, F11_ON_F10_D / 2, F11_ON_F10_TIP, mode=Mode.SUBTRACT)

    # F11 on F8
    with Locations(Plane(origin=(0, 0, -75), x_dir=(1, 0, 0), z_dir=(0, 0, -1))):
        with Locations((21.5, -46)):
            CounterSinkHole(F11_ON_F8_D / 2, F11_ON_F8_CSINK_D / 2, depth=F11_ON_F8_DEPTH, counter_sink_angle=F11_ON_F8_CSINK_ANGLE)
            with Locations((0, 0, -(F11_ON_F8_DEPTH + F11_ON_F8_TIP / 2))):  # 118° drill point
                Cone(0, F11_ON_F8_D / 2, F11_ON_F8_TIP, mode=Mode.SUBTRACT)

    # F12 (one way)
    with BuildSketch(Plane(origin=(0, 0, 0), x_dir=(1, 0, 0), z_dir=(0, 0, -1))):
        with Locations((-21.5, -46), (21.5, -46), (-21.5, 46), (21.5, 46)):
            Circle(F12_D / 2)
    extrude(amount=-F12_DEPTH, mode=Mode.SUBTRACT)
    with Locations(Plane(origin=(0, 0, 0), x_dir=(1, 0, 0), z_dir=(0, 0, -1))):
        with Locations((-21.5, -46), (21.5, -46), (-21.5, 46), (21.5, 46)):
            with Locations((0, 0, -(F12_DEPTH + F12_TIP / 2))):  # 118° drill point
                Cone(0, F12_D / 2, F12_TIP, mode=Mode.SUBTRACT)

    # F13 (on face) → F14 (cut)
    with BuildSketch(Plane.XY):
        Circle(F13_R)
    extrude(amount=F14_DEPTH, mode=Mode.SUBTRACT)

    # F15 (on face) → F16 (cut)
    with BuildSketch(Plane.XY):
        Circle(F15_R)
    extrude(amount=F16_DEPTH, mode=Mode.SUBTRACT)


solid = f5.part
